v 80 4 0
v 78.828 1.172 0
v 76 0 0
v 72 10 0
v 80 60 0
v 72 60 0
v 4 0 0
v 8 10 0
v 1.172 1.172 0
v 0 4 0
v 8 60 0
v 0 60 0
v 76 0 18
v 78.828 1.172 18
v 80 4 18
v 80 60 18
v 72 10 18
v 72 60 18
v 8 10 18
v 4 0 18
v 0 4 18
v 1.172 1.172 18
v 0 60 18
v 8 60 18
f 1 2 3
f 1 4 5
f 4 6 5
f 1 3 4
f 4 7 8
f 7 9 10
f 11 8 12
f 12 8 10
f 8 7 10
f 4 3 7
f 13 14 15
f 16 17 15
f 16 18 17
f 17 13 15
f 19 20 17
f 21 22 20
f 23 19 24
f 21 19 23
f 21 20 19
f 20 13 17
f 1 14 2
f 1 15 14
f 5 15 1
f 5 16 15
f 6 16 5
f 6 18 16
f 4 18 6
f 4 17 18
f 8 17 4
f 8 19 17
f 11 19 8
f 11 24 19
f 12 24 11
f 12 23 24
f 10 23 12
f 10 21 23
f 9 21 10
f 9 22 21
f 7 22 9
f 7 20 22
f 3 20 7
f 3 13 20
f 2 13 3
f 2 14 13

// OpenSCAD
$fn = 32;

// ----------------------------------------------------------------------
// Heat sink frame: 80 x 60 mm frame, 8 mm walls
// ----------------------------------------------------------------------

// --- parameters (mm) ---
profile_height = 18;      // extrusion height
profile_points = 12;      // points of the closed outline

profile = [[0, 4], [1.172, 1.172], [4, 0], [76, 0], [78.828, 1.172], [80, 4], [80, 60], [72, 60], [72, 10], [8, 10], [8, 60], [0, 60]];  // single closed polygon, 12 points, counter clockwise

// --- the one profile operation ---
linear_extrude(height = profile_height) polygon(points = profile);
